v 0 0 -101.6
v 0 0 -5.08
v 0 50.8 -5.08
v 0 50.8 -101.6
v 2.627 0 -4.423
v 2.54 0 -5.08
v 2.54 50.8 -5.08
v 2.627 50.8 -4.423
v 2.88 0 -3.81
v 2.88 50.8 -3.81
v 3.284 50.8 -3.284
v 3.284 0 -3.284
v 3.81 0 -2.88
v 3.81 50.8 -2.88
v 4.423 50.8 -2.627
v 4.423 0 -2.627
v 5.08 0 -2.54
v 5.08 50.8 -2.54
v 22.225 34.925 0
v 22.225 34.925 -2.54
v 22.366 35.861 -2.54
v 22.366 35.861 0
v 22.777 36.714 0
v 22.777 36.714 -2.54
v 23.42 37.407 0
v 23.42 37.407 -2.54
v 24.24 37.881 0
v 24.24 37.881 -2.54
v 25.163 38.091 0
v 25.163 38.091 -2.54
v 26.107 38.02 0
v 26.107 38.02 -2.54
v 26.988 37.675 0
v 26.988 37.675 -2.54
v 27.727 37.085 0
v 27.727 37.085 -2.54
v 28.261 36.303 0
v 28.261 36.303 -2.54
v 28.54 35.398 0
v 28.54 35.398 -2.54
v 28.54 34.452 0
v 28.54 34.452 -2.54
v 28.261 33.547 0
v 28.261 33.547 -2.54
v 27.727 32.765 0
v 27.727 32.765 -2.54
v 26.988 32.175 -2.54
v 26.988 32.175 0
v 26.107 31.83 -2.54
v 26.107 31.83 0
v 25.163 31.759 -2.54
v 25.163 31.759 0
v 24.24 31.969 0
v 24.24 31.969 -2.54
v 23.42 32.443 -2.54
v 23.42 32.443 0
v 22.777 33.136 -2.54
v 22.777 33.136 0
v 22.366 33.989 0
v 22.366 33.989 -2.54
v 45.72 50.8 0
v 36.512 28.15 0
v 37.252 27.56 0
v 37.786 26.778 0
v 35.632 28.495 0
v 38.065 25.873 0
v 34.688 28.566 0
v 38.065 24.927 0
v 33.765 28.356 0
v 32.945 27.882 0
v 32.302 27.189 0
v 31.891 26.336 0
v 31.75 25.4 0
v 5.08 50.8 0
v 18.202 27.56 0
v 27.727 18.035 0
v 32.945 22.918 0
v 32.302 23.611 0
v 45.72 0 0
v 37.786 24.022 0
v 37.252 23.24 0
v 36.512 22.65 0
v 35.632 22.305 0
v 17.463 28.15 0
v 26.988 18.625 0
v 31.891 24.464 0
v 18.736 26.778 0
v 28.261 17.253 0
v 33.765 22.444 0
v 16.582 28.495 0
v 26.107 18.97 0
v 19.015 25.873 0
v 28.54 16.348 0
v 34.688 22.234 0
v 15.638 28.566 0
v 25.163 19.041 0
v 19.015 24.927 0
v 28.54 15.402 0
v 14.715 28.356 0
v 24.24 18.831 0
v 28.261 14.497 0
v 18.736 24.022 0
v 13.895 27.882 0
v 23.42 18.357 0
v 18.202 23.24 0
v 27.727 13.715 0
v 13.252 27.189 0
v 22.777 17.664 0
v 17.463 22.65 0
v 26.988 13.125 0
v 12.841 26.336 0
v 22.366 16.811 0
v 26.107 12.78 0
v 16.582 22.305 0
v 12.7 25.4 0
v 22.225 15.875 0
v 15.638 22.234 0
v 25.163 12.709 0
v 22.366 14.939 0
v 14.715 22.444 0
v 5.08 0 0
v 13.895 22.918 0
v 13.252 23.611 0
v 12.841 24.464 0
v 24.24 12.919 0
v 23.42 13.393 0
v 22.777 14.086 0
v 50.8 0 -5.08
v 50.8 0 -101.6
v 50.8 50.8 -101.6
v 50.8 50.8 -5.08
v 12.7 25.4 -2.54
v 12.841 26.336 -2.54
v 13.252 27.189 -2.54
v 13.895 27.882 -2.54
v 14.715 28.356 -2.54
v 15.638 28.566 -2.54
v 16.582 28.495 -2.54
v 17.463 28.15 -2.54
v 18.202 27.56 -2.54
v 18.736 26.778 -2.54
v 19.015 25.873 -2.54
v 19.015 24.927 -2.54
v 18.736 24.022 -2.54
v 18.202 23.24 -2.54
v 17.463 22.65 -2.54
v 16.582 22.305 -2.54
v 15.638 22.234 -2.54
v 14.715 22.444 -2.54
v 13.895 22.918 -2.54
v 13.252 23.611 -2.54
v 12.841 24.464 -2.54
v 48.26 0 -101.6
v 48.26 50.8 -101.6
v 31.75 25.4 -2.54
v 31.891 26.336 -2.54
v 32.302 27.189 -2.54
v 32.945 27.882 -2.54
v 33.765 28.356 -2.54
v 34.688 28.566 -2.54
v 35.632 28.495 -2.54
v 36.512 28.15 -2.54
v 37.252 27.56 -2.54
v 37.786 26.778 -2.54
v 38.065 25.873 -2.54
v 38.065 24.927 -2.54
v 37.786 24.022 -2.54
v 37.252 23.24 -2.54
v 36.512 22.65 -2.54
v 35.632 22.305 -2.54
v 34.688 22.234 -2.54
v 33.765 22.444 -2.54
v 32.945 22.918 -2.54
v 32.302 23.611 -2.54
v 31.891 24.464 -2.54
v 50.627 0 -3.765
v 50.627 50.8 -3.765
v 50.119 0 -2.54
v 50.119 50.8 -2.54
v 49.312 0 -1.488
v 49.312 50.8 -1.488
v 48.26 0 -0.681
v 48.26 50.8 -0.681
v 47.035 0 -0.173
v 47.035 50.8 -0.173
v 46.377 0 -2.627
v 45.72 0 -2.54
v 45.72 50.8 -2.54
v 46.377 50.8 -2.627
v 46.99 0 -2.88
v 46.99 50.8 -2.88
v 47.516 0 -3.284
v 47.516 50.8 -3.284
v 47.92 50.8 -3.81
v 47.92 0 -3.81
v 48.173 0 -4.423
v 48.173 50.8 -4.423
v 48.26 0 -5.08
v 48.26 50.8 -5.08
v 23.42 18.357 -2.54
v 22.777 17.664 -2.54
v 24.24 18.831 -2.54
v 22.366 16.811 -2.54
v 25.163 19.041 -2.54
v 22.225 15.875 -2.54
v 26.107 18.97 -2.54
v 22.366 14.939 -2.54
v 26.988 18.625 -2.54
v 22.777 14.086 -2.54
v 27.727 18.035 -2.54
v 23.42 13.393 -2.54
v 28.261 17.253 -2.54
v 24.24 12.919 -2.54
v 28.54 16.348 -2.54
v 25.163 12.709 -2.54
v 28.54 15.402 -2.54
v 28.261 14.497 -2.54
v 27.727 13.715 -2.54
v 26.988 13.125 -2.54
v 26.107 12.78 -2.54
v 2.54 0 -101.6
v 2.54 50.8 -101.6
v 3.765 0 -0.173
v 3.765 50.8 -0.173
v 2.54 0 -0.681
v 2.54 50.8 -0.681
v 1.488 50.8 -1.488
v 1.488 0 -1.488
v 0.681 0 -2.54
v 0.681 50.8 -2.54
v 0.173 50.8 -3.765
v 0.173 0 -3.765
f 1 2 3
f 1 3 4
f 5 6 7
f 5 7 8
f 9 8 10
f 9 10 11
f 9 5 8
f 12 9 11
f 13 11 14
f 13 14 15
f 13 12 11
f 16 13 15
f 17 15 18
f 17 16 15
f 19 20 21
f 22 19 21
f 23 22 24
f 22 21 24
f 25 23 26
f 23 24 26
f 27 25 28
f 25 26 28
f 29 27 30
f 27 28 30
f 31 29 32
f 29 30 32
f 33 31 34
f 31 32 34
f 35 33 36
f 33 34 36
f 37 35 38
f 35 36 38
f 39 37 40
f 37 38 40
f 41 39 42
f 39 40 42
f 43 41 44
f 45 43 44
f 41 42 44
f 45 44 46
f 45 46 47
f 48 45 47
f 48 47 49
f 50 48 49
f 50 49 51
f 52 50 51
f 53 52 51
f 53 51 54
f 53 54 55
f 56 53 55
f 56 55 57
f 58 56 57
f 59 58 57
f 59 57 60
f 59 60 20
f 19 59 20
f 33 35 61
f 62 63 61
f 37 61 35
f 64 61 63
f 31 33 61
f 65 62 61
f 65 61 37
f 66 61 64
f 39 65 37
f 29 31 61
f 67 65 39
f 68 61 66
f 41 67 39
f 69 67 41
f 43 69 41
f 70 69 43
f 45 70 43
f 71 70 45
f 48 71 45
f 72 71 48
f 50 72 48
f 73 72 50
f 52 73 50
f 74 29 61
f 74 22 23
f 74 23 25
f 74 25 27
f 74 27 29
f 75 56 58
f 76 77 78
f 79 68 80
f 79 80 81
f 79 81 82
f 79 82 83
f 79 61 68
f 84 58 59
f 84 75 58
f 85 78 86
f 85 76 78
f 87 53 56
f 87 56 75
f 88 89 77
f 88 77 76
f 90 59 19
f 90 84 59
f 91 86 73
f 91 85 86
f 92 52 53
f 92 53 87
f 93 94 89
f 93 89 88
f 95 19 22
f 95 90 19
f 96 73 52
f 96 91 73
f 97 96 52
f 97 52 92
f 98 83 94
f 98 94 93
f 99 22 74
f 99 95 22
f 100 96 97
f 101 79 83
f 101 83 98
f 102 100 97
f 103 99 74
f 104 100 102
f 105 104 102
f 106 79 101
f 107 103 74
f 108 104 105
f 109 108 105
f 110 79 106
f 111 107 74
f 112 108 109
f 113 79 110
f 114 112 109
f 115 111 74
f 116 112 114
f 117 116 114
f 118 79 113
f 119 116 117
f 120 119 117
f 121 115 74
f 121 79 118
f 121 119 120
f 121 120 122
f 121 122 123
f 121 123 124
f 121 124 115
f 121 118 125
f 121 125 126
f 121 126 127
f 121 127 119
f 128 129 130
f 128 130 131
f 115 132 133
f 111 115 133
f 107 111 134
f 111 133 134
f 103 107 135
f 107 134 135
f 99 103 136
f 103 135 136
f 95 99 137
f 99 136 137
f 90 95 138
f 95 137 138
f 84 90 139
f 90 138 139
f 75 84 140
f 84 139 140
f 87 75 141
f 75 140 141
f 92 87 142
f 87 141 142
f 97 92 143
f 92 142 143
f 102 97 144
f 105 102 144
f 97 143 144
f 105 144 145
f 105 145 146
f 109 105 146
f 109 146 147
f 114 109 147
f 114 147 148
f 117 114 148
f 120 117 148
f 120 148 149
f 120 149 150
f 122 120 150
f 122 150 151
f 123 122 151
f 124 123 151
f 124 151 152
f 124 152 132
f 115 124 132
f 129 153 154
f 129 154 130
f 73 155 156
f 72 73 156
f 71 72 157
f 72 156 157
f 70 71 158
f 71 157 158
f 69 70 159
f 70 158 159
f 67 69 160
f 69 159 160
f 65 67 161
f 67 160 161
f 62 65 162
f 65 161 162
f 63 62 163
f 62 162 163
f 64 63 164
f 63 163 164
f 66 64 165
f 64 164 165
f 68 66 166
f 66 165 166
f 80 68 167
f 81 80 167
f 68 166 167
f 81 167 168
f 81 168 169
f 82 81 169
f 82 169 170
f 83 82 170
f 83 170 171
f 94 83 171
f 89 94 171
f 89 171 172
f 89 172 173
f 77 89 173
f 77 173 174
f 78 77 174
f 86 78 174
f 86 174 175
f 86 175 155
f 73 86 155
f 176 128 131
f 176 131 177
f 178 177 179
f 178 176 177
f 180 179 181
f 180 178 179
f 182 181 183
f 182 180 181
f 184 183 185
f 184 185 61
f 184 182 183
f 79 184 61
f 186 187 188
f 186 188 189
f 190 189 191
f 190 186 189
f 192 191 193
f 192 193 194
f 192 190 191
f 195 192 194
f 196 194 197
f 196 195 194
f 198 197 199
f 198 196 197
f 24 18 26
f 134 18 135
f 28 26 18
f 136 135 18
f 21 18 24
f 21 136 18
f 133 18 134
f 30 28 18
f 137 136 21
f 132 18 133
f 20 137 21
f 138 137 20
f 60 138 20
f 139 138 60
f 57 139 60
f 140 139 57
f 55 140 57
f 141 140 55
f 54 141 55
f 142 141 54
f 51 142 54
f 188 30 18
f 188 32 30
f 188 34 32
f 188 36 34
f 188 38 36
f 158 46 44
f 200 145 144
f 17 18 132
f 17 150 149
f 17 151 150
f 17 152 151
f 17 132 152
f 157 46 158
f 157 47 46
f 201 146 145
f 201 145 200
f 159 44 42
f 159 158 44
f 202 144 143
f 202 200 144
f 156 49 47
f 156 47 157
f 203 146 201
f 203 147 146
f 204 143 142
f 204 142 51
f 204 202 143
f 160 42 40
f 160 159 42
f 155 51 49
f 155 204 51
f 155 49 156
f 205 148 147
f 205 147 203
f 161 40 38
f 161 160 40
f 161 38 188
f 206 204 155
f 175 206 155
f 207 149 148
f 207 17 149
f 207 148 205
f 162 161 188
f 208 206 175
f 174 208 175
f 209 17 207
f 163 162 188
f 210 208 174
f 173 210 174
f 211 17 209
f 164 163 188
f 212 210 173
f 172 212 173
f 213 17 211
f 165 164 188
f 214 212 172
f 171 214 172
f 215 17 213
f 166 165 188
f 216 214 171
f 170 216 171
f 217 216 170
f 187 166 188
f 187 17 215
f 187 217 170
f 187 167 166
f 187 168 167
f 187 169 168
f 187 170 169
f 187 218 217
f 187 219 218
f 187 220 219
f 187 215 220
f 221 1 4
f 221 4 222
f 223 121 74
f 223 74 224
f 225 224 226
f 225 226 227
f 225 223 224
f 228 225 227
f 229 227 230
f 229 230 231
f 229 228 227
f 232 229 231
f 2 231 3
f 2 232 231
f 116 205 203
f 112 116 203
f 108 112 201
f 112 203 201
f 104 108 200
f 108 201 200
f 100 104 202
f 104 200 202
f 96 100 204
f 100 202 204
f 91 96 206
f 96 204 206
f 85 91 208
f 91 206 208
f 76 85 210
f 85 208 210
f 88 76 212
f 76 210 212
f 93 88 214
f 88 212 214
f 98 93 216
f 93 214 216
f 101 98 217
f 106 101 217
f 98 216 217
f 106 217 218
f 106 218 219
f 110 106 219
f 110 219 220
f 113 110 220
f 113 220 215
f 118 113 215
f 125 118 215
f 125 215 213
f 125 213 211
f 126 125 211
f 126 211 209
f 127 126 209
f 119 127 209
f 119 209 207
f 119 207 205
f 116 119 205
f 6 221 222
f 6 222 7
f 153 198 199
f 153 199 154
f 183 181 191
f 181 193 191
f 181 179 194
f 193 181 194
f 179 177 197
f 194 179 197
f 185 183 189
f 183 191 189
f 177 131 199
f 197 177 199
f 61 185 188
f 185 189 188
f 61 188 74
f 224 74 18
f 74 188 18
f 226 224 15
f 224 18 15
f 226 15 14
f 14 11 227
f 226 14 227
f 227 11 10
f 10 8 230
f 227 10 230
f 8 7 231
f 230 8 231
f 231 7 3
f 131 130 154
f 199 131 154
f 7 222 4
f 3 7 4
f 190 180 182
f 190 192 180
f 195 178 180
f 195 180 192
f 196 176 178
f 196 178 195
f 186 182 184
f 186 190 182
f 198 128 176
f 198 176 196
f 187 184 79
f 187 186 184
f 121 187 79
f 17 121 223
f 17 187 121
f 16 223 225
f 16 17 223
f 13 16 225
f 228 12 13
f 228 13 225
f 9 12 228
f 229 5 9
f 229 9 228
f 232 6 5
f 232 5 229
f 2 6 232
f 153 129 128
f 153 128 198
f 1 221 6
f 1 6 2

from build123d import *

# Parameters (mm, degrees)
BOSS_EXTRUDE1_DEPTH = 50.8
SKETCH2_R           = 3.175
CUT_EXTRUDE2_DEPTH  = 123.36896502


with BuildPart() as part:
    # Sketch1 → Boss-Extrude1 (new body)
    with BuildSketch(Plane(origin=(0, 0, 0), x_dir=(1, 0, 0), z_dir=(0, 1, 0))):
        with BuildLine():
            Line((0, 101.6), (2.54, 101.6))
            Line((2.54, 101.6), (2.54, 5.08))
            ThreePointArc((2.54, 5.08), (3.283948776, 3.283948776), (5.08, 2.54))
            Line((5.08, 2.54), (45.72, 2.54))
            ThreePointArc((45.72, 2.54), (47.516051224, 3.283948776), (48.26, 5.08))
            Line((48.26, 5.08), (48.26, 101.6))
            Line((48.26, 101.6), (50.8, 101.6))
            Line((50.8, 101.6), (50.8, 5.08))
            ThreePointArc((50.8, 5.08), (49.312102448, 1.487897552), (45.72, 0))
            Line((45.72, 0), (5.08, 0))
            ThreePointArc((5.08, 0), (1.487897552, 1.487897552), (0, 5.08))
            Line((0, 5.08), (0, 101.6))
        make_face()
    extrude(amount=BOSS_EXTRUDE1_DEPTH)

    # Sketch2 → Cut-Extrude2 (cut, through all)
    with BuildSketch(Plane(origin=(0, 0, -2.54), x_dir=(-1, 0, 0), z_dir=(0, 0, -1))):
        with Locations((-34.925, 25.4)):
            Circle(SKETCH2_R)
        with Locations((-25.4, 34.925)):
            Circle(SKETCH2_R)
        with Locations((-15.875, 25.4)):
            Circle(SKETCH2_R)
        with Locations((-25.4, 15.875)):
            Circle(SKETCH2_R)
    extrude(amount=-CUT_EXTRUDE2_DEPTH, mode=Mode.SUBTRACT)


solid = part.part
